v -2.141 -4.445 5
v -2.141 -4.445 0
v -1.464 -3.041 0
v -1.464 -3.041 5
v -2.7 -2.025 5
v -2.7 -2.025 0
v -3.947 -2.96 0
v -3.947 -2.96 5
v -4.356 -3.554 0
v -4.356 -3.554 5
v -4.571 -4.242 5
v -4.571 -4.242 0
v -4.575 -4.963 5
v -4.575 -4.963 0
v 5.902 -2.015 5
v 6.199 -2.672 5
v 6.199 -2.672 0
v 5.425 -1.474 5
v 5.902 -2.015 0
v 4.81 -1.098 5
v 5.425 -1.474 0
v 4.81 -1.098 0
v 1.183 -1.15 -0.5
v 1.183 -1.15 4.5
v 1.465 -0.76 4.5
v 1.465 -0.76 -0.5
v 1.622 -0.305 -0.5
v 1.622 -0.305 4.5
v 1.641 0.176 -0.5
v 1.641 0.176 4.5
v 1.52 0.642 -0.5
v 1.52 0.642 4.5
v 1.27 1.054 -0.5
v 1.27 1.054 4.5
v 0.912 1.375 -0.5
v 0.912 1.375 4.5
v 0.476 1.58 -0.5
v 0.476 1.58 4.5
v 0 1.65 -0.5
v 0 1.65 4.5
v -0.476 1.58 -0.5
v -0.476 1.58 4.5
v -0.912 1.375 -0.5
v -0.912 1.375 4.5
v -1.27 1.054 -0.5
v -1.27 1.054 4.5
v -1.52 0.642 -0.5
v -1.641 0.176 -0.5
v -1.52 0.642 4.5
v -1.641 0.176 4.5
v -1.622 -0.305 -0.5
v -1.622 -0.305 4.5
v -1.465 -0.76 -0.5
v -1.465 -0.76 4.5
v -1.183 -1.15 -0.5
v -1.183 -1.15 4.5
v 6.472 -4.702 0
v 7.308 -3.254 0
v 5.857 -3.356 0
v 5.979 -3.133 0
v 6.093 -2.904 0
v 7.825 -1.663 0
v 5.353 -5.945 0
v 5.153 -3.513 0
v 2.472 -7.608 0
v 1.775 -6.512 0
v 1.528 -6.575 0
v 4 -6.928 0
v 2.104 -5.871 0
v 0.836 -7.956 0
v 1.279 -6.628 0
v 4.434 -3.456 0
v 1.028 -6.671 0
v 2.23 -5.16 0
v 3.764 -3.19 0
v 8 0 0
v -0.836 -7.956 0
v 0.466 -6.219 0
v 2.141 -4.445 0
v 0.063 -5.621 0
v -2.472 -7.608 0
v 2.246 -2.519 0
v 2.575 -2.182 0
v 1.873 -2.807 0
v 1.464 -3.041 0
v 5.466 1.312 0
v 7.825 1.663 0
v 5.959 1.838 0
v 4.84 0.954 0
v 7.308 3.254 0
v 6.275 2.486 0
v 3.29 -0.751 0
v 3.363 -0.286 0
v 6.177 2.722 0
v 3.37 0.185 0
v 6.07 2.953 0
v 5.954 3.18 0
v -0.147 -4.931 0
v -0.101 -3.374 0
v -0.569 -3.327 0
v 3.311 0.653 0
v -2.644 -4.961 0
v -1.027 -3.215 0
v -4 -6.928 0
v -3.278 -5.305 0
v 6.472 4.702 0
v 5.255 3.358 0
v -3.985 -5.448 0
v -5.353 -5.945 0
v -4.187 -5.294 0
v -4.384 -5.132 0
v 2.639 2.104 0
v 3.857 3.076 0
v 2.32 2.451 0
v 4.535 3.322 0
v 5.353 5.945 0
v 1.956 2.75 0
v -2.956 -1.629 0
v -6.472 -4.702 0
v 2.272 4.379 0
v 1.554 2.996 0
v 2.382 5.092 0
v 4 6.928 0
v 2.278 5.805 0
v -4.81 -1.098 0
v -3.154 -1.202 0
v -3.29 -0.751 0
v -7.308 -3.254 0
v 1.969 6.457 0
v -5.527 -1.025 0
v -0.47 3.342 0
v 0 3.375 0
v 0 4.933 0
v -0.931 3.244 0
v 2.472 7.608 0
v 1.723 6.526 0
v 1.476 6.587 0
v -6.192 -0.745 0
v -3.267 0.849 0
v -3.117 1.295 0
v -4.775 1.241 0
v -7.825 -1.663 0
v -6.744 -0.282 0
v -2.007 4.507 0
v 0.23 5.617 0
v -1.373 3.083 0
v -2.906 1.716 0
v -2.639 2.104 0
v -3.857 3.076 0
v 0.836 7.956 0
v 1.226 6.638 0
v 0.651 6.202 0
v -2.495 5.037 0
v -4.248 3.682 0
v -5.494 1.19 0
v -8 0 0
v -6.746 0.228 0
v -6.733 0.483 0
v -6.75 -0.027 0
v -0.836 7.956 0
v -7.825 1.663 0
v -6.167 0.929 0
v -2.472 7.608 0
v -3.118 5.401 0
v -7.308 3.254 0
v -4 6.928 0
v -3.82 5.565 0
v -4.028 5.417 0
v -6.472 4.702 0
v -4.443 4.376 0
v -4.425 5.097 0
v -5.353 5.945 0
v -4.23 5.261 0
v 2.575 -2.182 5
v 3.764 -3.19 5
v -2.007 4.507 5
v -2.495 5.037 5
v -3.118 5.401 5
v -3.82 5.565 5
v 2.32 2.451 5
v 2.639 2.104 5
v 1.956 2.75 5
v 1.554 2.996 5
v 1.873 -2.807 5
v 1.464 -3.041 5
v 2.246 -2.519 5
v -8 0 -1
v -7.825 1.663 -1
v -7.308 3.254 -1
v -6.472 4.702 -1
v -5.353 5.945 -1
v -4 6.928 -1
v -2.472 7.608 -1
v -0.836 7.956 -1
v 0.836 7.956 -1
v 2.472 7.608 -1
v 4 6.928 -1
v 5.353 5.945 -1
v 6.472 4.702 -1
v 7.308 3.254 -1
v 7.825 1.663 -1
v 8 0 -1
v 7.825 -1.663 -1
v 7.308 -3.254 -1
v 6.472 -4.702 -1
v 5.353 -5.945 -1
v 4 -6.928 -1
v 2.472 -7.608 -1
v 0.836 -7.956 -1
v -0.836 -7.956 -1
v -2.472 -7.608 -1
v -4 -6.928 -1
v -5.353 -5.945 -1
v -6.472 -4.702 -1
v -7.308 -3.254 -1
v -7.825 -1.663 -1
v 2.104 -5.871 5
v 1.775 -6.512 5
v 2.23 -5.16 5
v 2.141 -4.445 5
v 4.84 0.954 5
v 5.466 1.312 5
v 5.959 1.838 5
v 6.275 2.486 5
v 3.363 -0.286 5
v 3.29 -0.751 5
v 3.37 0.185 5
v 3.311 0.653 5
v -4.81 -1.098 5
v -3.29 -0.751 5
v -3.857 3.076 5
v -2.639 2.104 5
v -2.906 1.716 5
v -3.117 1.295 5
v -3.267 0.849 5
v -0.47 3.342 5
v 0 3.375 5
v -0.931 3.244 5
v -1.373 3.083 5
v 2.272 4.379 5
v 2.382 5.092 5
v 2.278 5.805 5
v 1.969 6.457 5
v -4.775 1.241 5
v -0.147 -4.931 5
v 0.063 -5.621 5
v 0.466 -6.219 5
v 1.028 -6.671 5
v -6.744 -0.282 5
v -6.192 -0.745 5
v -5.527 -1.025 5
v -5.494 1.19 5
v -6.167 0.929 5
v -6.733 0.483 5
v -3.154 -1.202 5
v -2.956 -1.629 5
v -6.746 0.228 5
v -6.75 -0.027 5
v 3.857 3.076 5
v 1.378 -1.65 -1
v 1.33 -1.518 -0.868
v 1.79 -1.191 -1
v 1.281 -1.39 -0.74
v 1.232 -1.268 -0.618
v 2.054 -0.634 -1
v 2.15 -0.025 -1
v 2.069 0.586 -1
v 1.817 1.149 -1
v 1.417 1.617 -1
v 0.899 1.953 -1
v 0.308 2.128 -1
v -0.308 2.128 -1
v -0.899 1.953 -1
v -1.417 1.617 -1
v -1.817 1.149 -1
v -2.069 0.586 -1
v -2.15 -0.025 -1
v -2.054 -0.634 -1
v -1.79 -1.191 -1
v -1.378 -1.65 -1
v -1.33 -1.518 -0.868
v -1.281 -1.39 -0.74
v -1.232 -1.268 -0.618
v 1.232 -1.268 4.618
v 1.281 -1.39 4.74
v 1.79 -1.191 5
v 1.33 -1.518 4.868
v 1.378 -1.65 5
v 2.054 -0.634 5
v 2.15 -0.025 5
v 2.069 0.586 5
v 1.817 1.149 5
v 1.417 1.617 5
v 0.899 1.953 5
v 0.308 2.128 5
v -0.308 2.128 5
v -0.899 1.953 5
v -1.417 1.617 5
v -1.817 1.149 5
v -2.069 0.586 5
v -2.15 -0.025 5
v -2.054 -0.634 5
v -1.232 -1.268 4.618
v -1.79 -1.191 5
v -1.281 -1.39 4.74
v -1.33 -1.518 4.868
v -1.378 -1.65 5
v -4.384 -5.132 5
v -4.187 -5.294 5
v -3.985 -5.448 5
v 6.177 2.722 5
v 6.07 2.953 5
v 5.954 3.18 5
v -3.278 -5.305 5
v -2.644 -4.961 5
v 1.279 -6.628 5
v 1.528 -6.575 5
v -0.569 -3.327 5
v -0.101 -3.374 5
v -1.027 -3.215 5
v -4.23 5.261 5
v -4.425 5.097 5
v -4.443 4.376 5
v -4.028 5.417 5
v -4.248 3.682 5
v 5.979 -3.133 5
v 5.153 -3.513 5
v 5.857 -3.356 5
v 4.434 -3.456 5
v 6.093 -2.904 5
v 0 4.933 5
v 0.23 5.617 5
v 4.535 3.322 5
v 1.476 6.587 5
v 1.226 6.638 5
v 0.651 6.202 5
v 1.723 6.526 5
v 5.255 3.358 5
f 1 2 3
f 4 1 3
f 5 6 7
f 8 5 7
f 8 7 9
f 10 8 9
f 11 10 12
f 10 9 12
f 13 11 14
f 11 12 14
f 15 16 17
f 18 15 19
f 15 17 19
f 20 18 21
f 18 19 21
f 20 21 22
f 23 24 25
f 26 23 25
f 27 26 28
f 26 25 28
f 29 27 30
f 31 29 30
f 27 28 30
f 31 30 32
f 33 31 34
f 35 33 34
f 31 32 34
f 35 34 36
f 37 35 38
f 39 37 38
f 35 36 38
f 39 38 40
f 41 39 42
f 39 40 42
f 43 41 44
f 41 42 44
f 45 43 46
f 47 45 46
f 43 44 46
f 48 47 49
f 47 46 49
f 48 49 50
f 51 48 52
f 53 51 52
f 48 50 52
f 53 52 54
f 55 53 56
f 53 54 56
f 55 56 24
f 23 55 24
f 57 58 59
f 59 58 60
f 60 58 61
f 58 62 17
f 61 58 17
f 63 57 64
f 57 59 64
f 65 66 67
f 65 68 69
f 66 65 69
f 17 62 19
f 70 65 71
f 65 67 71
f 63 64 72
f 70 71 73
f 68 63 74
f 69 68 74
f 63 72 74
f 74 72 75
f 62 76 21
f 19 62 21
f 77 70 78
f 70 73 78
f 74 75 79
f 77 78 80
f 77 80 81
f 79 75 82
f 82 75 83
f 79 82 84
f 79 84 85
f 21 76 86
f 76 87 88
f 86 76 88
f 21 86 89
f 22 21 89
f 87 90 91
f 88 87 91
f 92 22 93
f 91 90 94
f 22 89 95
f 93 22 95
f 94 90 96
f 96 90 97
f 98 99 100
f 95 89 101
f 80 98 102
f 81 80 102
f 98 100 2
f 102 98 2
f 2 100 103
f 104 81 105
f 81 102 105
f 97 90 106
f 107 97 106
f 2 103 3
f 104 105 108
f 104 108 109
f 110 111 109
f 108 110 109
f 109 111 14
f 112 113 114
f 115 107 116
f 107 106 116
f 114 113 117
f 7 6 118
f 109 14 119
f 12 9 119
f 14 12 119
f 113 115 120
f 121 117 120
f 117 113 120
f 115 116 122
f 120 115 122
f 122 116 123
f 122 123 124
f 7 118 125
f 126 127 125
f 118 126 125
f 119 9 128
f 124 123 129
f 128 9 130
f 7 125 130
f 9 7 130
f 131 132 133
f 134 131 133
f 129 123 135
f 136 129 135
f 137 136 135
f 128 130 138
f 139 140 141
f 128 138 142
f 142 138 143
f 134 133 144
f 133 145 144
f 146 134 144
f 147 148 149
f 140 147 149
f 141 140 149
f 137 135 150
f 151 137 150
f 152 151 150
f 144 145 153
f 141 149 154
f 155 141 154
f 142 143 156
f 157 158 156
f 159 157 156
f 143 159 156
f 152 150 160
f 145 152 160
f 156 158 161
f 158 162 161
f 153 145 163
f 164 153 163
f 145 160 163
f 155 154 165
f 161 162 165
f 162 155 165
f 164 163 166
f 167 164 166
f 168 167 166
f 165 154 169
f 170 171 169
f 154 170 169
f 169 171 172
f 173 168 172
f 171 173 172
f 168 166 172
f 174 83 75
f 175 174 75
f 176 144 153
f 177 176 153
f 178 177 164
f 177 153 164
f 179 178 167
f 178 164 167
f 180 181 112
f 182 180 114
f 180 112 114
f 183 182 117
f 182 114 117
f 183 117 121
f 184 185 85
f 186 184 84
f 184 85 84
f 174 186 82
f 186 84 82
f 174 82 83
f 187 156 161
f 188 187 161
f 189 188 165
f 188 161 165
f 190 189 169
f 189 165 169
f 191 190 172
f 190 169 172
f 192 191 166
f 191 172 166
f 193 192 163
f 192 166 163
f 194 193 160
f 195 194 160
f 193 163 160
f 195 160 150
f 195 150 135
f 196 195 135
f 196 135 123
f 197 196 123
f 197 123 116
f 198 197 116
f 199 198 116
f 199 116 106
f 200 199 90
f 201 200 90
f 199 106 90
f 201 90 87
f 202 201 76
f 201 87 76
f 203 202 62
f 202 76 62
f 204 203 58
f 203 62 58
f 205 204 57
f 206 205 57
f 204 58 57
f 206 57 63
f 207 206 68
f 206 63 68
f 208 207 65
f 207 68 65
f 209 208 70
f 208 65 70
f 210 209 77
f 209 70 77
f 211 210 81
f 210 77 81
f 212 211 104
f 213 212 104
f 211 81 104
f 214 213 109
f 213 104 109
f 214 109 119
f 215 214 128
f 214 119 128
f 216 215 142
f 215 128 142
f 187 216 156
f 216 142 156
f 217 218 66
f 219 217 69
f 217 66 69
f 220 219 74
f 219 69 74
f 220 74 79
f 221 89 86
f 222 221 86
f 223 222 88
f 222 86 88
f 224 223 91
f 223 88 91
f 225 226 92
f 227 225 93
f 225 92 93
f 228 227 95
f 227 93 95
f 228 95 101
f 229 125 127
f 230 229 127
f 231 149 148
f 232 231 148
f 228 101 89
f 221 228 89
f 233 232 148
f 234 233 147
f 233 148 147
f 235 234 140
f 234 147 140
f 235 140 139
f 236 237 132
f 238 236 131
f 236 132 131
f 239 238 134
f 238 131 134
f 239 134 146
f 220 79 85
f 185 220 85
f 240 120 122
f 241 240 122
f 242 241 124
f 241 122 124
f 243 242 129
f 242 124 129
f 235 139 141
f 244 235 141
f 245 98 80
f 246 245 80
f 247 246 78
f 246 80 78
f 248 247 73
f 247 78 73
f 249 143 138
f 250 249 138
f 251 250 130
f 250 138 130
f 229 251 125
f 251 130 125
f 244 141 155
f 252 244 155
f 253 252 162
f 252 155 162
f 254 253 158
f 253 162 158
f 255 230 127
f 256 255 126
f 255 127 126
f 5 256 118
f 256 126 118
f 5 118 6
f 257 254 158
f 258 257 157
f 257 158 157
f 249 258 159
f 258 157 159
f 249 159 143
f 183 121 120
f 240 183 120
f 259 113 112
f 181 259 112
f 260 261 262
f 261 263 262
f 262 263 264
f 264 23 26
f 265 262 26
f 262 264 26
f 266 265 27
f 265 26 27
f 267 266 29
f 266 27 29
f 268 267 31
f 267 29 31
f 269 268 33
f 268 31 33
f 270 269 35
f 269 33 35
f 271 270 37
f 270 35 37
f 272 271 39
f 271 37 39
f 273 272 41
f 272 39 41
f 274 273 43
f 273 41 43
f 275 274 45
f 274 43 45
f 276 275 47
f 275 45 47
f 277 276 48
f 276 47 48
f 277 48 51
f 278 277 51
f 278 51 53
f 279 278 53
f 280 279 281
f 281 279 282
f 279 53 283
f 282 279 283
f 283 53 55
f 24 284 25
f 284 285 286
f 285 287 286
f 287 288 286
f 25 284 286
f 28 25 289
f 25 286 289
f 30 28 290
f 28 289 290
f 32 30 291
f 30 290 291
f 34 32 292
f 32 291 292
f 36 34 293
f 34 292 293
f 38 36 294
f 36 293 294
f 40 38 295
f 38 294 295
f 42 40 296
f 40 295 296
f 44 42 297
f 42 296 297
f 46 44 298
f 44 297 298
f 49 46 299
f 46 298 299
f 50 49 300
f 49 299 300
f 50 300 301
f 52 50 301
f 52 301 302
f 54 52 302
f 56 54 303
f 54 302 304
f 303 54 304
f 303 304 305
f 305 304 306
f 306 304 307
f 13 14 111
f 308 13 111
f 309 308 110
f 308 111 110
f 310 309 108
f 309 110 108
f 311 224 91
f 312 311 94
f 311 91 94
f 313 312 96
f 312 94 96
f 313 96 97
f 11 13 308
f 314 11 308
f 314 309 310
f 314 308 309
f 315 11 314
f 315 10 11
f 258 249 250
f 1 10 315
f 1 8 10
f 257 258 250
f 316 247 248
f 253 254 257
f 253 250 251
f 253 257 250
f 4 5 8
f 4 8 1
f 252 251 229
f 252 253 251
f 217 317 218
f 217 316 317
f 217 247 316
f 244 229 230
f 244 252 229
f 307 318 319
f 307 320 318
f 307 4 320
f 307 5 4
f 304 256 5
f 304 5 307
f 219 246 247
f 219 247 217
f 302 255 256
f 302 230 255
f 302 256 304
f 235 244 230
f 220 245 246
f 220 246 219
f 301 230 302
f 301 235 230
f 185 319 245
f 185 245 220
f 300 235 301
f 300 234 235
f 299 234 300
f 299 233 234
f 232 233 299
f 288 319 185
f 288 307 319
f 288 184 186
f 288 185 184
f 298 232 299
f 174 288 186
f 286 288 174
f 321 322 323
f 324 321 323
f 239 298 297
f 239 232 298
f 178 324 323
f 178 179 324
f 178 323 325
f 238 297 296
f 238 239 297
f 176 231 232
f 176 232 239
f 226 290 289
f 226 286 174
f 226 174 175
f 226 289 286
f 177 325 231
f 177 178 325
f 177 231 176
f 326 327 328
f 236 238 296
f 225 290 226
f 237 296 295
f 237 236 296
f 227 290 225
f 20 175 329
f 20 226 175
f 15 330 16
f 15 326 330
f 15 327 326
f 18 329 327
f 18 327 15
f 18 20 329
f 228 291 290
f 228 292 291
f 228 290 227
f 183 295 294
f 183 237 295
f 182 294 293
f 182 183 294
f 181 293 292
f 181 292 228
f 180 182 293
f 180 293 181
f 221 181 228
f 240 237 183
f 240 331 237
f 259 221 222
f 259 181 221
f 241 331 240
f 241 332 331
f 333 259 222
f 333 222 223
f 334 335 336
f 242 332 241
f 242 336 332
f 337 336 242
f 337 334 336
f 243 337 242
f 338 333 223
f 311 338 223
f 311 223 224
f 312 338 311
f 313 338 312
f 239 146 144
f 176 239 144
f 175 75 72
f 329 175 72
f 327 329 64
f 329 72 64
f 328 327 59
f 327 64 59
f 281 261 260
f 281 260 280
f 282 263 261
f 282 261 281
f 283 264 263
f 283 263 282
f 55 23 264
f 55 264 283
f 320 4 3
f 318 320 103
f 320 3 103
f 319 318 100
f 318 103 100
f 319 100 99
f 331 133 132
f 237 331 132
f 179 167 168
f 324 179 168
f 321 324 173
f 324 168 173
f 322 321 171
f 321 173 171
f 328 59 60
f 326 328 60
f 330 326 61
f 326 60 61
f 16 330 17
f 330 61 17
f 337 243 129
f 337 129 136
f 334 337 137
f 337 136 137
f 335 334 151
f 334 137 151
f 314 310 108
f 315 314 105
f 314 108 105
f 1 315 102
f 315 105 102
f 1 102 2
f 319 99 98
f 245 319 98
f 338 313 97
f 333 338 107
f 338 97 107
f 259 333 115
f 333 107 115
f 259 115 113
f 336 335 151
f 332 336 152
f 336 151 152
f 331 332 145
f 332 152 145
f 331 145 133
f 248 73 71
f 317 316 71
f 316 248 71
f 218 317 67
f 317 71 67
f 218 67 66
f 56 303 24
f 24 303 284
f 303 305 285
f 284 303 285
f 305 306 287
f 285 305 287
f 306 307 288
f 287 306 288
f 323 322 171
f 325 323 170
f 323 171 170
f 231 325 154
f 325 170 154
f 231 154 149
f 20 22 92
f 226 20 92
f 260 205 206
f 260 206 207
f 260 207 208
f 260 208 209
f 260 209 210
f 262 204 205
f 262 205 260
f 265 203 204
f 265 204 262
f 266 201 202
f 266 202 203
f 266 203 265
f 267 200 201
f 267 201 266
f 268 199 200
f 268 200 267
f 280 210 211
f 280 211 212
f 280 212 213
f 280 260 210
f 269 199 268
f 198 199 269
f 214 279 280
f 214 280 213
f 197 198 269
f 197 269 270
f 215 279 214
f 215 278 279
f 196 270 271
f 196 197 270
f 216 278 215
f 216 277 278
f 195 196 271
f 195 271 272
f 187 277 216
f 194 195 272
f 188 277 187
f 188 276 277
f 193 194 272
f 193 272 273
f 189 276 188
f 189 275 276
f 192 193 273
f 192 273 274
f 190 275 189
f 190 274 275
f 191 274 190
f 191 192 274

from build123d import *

# Parameters (mm, degrees)
SKETCH2_R                   = 6.75
GEAR_OUTSIDE_DIAMETER_DEPTH = 5
GEAR_TOOTH_CUT_DEPTH        = 6
GEAR_TEETH_COUNT            = 7
SKETCH3_R                   = 3.375
GEAR_DEDENDUM_CIRCLE_DEPTH  = 5
SKETCH5_R                   = 8
BOSS_EXTRUDE1_DEPTH         = 1
CUT_EXTRUDE1_DEPTH          = 7
CHAMFER2_SIZE               = 0.5


with BuildPart() as part:
    # Sketch2 → gear outside diameter (new body)
    with BuildSketch(Plane.XY):
        Circle(SKETCH2_R)
    extrude(amount=GEAR_OUTSIDE_DIAMETER_DEPTH)

    # Sketch1 → gear tooth cut (cut, through all)
    with BuildSketch(Plane.XY):
        with BuildLine():
            Line((0, 4.933386259), (0, 3.375))
            ThreePointArc((0, 3.375), (-0.701885443, 3.301209146), (-1.373078899, 3.083063304))
            Line((-1.373078899, 3.083063304), (-2.007089948, 4.506649523))
            ThreePointArc((-2.007089948, 4.506649523), (-2.793182164, 5.242332608), (-3.820403893, 5.564801352))
            ThreePointArc((-3.820403893, 5.564801352), (-1.403770885, 6.602418292), (1.225966143, 6.637733575))
            ThreePointArc((1.225966143, 6.637733575), (0.41879145, 5.925245269), (0, 4.933386259))
        make_face()
    gear_tooth_cut = extrude(amount=GEAR_TOOTH_CUT_DEPTH, mode=Mode.SUBTRACT)

    # gear teeth: gear tooth cut ×7 about axis
    gear_teeth_axis = Axis((0, 0, 0), (0, 0, 1))
    for i in range(1, GEAR_TEETH_COUNT):
        add(gear_tooth_cut.rotate(gear_teeth_axis, i * 360 / GEAR_TEETH_COUNT), mode=Mode.SUBTRACT)

    # Sketch3 → gear dedendum circle (add)
    with BuildSketch(Plane.XY):
        Circle(SKETCH3_R)
    extrude(amount=GEAR_DEDENDUM_CIRCLE_DEPTH)

    # Sketch5 → Boss-Extrude1 (add)
    with BuildSketch(Plane(origin=(0, 0, 0), x_dir=(-1, 0, 0), z_dir=(0, 0, -1))):
        Circle(SKETCH5_R)
    extrude(amount=BOSS_EXTRUDE1_DEPTH)

    # Sketch4 → Cut-Extrude1 (cut, through all)
    with BuildSketch(Plane.XY.offset(5)):
        with BuildLine():
            Line((-1.183215957, -1.15), (1.183215957, -1.15))
            ThreePointArc((1.183215957, -1.15), (0, 1.65), (-1.183215957, -1.15))
        make_face()
    extrude(amount=-CUT_EXTRUDE1_DEPTH, mode=Mode.SUBTRACT)

    # Chamfer2
    chamfer2_edges = [part.edges().sort_by_distance(p)[0] for p in [
        (0, 1.65, -1),
        (0, -1.15, -1),
        (0, 1.65, 5),
        (0, -1.15, 5),
    ]]
    chamfer(chamfer2_edges, length=CHAMFER2_SIZE)


solid = part.part
